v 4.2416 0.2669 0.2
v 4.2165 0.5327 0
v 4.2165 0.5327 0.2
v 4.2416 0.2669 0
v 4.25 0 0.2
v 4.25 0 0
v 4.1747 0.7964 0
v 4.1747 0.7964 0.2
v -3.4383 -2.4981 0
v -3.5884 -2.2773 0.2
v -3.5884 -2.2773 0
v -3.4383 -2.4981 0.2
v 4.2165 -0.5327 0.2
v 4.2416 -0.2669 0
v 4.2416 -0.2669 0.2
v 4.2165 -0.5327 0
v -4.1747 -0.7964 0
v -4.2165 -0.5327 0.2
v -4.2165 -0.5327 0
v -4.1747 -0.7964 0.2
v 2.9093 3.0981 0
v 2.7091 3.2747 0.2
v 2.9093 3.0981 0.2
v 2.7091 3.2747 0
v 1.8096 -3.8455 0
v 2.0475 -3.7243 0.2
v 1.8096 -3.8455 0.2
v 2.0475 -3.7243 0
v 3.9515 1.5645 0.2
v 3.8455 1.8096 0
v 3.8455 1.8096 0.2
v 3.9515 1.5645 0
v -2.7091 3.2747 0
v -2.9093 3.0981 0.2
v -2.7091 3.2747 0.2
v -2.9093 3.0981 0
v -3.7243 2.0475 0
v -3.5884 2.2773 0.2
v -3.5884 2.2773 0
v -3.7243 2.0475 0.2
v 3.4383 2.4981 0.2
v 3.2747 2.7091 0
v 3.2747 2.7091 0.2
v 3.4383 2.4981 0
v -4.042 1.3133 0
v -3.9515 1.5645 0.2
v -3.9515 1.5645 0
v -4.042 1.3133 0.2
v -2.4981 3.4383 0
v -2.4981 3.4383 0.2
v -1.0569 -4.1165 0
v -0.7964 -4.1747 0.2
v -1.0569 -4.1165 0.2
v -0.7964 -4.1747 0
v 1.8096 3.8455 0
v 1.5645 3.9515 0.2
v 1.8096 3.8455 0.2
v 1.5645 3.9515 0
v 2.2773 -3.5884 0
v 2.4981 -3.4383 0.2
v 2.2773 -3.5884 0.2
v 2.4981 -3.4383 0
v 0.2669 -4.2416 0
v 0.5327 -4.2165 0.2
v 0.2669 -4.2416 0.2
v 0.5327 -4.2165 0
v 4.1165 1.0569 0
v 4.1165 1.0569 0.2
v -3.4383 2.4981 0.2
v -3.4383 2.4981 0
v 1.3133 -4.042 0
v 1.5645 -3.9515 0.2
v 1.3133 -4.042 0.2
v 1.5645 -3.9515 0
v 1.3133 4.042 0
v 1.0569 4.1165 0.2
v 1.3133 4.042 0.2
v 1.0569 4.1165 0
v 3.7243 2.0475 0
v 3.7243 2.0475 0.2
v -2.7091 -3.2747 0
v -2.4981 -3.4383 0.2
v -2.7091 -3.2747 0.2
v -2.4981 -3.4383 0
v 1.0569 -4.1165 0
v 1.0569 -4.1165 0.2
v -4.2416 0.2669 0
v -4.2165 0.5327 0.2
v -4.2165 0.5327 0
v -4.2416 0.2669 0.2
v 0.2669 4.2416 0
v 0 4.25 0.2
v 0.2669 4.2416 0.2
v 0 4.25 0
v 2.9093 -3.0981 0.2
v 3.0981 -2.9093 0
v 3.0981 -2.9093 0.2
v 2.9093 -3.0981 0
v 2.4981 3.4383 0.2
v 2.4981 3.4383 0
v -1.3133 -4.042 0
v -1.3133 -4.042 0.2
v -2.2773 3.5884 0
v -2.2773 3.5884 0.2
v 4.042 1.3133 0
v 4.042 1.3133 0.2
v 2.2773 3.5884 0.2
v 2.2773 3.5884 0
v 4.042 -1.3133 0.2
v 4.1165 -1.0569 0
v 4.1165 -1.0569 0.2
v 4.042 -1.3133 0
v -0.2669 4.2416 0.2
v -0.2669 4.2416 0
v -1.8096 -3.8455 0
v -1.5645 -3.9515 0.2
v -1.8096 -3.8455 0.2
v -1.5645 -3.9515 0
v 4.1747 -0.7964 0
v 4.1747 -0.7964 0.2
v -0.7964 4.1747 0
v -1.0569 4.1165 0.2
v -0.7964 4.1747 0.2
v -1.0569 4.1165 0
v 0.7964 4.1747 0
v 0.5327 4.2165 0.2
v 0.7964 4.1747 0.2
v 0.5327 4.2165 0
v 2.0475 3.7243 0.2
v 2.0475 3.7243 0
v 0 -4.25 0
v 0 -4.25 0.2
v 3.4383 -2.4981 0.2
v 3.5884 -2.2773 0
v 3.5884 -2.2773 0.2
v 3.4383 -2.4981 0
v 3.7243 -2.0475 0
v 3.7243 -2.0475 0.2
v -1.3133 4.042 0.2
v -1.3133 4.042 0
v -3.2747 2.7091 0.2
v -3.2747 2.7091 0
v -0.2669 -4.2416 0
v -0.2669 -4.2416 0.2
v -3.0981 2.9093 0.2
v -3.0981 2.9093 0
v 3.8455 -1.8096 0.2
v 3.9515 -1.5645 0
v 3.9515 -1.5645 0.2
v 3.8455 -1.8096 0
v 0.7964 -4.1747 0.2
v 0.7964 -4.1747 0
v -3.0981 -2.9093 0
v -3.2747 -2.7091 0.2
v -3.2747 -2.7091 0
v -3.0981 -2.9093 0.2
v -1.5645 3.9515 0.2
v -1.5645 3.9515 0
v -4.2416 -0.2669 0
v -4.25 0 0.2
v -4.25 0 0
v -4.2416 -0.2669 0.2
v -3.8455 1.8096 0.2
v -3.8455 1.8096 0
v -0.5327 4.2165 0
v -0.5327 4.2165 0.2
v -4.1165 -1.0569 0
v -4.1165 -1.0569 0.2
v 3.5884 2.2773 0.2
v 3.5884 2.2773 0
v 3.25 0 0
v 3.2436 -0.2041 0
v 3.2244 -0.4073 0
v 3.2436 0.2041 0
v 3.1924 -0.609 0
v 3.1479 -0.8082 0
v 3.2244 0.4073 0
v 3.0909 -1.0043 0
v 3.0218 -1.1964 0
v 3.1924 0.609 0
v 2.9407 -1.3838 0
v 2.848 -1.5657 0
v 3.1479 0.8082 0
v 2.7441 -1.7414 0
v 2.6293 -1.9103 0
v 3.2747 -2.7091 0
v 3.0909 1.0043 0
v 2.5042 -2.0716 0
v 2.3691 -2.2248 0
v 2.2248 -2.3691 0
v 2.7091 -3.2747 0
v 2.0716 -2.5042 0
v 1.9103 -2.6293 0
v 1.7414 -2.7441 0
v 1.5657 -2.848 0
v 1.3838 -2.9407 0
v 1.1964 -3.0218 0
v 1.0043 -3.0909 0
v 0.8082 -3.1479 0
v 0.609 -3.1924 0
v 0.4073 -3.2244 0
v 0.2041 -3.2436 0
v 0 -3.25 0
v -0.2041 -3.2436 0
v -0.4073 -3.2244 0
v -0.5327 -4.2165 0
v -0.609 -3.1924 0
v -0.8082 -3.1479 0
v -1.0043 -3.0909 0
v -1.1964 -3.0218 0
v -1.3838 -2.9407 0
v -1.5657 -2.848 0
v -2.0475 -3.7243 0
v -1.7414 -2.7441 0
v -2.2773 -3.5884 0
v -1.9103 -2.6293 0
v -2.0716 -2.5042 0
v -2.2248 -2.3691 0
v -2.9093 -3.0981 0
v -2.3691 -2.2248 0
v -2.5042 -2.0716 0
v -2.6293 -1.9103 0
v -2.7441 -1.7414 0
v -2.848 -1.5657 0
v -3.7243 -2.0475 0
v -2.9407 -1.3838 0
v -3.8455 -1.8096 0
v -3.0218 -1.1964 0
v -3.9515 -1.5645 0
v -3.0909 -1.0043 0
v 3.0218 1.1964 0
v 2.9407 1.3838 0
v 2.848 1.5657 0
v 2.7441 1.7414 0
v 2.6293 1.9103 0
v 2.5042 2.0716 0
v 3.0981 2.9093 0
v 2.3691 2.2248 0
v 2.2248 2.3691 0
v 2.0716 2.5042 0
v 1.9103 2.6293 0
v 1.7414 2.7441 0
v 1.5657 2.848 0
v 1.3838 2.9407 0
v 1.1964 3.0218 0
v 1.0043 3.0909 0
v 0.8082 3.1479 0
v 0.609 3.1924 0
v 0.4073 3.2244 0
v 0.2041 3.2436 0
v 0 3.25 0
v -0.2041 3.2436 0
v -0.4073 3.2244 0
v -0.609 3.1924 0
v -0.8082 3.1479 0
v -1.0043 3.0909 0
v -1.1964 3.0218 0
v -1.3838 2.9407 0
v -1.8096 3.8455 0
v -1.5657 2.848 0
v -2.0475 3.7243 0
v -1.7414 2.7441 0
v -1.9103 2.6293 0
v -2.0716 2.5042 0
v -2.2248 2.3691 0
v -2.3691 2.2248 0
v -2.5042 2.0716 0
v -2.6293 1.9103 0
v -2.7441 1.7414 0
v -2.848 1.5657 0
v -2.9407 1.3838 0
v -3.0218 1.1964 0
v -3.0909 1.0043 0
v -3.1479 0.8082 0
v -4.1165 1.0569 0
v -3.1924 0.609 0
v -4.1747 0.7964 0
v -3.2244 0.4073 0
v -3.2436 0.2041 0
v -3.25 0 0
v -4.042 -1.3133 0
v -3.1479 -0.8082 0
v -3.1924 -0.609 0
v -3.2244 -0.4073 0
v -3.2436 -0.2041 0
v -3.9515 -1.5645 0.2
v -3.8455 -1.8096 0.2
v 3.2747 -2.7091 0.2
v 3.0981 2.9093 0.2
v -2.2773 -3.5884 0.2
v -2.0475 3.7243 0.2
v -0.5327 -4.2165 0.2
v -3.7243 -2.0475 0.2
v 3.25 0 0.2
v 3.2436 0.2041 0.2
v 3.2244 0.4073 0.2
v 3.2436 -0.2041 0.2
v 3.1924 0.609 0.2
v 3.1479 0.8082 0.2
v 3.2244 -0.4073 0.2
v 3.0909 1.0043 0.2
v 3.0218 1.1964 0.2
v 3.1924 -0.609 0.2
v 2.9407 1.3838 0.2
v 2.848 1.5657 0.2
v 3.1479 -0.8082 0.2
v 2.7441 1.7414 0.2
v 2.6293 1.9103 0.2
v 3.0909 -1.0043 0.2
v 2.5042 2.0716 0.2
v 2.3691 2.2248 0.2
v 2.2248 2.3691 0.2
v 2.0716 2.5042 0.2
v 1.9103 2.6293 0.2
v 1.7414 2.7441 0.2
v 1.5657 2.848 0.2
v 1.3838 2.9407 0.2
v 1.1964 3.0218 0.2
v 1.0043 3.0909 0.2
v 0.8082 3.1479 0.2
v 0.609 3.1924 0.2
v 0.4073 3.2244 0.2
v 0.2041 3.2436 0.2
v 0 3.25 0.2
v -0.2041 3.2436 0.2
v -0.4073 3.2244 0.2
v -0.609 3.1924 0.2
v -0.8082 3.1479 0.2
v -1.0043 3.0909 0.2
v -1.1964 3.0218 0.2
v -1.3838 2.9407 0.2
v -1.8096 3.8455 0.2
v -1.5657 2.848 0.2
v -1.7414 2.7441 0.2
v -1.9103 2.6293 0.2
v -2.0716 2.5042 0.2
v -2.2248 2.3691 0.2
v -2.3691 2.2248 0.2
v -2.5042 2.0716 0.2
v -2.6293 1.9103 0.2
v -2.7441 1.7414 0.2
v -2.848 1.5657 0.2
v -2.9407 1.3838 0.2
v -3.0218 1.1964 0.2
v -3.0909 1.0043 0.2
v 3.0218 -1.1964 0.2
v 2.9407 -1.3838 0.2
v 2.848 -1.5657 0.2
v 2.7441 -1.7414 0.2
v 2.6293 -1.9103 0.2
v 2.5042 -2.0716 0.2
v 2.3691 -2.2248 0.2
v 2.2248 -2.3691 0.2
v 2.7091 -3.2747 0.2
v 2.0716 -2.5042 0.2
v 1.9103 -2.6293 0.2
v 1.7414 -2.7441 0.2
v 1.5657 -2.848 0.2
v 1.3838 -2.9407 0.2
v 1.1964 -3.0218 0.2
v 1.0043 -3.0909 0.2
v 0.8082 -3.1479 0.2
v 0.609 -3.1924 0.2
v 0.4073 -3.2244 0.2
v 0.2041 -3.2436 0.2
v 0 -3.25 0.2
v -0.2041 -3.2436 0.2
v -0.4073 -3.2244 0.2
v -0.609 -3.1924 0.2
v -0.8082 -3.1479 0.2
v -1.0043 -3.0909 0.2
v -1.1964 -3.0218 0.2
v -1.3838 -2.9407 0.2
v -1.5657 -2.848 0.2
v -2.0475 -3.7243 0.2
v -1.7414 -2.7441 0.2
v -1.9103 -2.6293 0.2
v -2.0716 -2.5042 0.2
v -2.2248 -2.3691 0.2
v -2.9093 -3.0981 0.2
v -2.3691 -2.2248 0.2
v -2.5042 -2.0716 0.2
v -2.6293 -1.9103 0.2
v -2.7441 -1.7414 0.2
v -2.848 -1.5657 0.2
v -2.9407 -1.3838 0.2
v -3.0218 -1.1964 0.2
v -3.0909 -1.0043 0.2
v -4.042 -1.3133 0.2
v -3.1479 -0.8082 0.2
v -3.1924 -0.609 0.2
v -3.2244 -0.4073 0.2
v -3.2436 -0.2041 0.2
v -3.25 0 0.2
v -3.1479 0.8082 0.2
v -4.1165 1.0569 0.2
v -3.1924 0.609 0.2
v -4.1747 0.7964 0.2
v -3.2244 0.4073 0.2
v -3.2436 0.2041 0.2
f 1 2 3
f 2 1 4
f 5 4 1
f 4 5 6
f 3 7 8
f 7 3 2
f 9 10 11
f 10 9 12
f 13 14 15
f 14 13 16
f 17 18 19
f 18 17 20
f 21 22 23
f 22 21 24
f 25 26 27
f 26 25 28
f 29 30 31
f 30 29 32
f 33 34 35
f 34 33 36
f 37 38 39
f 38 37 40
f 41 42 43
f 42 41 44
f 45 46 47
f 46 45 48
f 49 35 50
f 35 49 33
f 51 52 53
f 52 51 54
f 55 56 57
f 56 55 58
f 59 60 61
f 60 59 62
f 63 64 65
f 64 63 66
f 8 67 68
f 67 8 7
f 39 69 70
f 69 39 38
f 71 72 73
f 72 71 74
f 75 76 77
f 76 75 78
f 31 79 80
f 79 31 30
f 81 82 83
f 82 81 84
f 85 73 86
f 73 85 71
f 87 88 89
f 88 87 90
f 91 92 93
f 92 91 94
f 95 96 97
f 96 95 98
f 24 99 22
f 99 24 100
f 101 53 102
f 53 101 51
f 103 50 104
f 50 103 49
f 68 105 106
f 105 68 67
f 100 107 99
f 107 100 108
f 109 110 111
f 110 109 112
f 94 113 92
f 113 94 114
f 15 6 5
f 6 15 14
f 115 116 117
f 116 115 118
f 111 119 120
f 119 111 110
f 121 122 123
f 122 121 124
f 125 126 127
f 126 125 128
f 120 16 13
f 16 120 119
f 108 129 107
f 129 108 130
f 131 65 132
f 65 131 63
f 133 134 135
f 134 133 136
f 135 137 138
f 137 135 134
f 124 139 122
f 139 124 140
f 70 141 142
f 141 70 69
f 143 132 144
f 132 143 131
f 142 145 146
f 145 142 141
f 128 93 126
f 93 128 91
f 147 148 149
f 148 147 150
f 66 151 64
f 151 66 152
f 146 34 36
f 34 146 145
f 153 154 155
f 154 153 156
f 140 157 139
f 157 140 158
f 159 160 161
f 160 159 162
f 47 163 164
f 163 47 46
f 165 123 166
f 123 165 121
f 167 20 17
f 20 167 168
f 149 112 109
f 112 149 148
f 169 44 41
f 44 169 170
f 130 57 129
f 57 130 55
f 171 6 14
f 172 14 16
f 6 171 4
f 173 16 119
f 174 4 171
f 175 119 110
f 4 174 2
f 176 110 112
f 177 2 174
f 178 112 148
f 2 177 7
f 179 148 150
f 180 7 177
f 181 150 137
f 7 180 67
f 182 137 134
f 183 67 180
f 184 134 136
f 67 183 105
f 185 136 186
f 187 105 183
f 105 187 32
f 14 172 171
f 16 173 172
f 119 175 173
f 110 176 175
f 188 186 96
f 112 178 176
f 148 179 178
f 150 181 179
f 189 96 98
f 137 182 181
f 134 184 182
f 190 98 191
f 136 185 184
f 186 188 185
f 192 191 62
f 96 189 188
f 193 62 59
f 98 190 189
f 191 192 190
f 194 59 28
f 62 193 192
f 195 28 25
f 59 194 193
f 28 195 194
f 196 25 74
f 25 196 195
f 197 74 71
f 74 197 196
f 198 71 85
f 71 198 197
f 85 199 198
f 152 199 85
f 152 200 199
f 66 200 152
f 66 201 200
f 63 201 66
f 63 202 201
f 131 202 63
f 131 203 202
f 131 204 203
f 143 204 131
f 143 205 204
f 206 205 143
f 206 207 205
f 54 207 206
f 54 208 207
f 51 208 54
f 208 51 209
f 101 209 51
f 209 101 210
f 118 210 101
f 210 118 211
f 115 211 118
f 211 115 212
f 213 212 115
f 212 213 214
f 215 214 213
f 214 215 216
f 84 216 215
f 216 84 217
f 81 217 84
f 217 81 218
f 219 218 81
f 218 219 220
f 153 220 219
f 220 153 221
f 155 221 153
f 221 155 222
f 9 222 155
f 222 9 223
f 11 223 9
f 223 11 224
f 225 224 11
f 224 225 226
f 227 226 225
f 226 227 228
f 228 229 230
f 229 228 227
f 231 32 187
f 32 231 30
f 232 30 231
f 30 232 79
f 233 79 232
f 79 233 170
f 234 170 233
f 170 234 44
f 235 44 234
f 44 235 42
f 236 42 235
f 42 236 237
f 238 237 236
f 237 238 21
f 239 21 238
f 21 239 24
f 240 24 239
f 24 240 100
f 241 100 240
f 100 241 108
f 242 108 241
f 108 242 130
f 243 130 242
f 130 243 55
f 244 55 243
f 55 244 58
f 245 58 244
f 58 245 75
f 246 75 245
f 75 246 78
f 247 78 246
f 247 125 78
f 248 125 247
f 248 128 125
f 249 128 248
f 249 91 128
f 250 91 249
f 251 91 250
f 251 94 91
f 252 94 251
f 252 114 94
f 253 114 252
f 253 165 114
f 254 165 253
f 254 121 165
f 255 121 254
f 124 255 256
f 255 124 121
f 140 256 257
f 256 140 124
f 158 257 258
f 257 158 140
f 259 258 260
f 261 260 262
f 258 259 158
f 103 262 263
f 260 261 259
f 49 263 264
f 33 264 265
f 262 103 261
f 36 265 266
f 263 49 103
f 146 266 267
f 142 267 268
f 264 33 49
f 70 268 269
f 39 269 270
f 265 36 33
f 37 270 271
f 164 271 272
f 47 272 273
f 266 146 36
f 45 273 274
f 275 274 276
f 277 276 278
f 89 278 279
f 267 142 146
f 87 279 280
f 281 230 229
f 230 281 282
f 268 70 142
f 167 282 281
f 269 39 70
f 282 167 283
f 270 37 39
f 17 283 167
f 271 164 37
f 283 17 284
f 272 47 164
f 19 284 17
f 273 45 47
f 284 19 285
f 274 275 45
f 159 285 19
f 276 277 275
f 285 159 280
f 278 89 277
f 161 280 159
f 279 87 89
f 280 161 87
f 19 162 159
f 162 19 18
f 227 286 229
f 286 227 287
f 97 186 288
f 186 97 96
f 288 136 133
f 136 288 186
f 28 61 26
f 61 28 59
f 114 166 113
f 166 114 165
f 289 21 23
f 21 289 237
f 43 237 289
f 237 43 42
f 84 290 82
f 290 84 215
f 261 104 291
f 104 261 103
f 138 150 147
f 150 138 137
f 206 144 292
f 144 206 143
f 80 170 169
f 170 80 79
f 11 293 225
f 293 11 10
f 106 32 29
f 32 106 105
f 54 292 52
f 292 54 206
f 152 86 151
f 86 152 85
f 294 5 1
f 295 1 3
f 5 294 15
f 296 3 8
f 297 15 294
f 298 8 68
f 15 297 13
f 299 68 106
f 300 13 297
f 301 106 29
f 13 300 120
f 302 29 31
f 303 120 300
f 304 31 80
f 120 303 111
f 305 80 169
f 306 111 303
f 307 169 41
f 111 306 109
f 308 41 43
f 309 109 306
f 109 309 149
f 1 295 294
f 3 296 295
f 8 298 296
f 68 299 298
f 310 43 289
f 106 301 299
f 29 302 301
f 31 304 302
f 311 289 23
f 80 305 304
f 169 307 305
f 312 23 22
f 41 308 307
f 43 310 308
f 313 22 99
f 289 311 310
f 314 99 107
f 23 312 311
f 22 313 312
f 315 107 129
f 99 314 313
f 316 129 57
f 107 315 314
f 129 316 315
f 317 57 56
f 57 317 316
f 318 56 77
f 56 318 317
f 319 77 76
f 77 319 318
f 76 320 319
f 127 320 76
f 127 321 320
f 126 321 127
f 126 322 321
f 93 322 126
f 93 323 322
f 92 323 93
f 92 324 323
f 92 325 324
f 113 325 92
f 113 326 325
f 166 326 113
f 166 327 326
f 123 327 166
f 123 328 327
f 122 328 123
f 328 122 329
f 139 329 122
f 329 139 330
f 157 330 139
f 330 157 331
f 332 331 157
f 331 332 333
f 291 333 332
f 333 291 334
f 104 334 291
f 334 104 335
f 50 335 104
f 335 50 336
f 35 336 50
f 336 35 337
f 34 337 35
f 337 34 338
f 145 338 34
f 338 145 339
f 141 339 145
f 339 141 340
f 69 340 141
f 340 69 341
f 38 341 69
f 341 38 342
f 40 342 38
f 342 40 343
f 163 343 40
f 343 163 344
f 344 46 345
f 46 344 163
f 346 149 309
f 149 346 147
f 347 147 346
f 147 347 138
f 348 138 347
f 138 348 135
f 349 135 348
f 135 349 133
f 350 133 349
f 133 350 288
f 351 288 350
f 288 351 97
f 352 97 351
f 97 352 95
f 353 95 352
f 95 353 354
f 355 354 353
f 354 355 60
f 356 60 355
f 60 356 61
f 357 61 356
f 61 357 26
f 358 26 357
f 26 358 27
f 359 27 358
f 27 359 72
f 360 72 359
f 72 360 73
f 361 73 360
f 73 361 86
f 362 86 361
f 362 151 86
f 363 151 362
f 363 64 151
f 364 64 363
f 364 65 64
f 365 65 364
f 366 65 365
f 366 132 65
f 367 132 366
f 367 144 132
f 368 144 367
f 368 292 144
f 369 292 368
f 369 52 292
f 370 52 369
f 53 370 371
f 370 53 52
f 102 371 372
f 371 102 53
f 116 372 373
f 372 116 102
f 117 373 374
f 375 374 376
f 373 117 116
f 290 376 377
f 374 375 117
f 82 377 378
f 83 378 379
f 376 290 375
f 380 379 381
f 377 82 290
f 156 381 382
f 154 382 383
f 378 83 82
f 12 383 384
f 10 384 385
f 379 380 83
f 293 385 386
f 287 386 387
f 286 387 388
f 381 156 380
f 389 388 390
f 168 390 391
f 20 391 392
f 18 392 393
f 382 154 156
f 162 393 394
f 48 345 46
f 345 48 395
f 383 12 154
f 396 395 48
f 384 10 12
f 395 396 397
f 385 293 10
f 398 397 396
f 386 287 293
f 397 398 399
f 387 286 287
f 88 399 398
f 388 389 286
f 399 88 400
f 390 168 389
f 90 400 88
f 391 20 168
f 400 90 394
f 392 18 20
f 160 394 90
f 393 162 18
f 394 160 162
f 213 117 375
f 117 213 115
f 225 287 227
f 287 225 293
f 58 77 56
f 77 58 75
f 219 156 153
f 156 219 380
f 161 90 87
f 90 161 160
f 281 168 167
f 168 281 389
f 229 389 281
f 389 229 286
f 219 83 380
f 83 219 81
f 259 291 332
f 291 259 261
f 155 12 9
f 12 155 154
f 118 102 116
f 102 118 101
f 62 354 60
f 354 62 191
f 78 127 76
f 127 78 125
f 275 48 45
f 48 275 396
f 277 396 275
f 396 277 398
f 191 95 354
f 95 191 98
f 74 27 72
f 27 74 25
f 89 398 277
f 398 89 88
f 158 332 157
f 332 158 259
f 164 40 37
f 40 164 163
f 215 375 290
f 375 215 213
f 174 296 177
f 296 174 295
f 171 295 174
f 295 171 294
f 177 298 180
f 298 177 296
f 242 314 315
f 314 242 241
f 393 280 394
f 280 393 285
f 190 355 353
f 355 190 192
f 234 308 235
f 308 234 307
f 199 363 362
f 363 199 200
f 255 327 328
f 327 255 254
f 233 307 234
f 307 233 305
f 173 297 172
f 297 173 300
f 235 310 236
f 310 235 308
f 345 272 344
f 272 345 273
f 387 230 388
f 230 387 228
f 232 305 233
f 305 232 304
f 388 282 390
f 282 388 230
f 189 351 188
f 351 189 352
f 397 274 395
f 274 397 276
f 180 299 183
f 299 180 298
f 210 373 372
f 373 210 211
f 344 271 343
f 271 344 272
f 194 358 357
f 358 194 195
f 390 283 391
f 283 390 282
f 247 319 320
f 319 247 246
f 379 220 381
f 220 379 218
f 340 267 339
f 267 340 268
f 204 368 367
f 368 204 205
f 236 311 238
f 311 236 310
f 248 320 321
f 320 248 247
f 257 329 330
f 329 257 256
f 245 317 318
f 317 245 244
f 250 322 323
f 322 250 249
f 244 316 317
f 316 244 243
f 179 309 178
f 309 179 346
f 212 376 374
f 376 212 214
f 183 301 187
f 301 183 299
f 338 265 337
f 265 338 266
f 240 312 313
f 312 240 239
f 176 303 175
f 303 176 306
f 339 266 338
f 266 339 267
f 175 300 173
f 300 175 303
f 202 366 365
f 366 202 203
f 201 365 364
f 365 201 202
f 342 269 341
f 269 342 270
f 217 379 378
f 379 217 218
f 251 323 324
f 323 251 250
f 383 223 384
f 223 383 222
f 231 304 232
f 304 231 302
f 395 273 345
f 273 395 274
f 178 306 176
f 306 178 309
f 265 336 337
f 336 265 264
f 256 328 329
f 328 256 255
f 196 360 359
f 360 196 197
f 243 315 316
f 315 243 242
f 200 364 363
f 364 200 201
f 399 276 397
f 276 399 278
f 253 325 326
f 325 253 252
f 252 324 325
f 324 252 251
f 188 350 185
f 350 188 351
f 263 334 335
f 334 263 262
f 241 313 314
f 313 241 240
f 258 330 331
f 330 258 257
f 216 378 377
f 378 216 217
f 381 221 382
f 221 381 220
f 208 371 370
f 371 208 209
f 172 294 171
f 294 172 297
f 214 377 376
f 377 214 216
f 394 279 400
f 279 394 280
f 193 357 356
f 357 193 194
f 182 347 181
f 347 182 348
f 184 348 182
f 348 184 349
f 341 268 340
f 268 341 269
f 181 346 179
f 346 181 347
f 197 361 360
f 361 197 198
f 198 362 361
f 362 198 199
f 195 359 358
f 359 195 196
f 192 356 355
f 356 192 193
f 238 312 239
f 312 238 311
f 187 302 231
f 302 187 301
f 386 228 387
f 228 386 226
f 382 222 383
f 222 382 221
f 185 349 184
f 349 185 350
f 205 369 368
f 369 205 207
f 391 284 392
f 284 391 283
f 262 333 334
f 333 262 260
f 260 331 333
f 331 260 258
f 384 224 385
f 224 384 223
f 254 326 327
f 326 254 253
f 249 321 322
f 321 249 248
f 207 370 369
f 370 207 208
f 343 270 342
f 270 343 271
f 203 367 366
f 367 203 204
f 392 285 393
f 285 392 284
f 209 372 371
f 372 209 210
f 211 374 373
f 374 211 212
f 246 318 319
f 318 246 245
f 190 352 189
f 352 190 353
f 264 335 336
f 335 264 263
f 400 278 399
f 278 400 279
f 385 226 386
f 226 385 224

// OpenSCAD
INNER_DIA = 6.5;
OUTER_DIA = 8.5;
THICKNESS = 0.2;

$fn = 100;

module shim() {
  difference() {
    cylinder(d = OUTER_DIA, h = THICKNESS);
    cylinder(d = INNER_DIA, h = THICKNESS);
  }
}

shim();
